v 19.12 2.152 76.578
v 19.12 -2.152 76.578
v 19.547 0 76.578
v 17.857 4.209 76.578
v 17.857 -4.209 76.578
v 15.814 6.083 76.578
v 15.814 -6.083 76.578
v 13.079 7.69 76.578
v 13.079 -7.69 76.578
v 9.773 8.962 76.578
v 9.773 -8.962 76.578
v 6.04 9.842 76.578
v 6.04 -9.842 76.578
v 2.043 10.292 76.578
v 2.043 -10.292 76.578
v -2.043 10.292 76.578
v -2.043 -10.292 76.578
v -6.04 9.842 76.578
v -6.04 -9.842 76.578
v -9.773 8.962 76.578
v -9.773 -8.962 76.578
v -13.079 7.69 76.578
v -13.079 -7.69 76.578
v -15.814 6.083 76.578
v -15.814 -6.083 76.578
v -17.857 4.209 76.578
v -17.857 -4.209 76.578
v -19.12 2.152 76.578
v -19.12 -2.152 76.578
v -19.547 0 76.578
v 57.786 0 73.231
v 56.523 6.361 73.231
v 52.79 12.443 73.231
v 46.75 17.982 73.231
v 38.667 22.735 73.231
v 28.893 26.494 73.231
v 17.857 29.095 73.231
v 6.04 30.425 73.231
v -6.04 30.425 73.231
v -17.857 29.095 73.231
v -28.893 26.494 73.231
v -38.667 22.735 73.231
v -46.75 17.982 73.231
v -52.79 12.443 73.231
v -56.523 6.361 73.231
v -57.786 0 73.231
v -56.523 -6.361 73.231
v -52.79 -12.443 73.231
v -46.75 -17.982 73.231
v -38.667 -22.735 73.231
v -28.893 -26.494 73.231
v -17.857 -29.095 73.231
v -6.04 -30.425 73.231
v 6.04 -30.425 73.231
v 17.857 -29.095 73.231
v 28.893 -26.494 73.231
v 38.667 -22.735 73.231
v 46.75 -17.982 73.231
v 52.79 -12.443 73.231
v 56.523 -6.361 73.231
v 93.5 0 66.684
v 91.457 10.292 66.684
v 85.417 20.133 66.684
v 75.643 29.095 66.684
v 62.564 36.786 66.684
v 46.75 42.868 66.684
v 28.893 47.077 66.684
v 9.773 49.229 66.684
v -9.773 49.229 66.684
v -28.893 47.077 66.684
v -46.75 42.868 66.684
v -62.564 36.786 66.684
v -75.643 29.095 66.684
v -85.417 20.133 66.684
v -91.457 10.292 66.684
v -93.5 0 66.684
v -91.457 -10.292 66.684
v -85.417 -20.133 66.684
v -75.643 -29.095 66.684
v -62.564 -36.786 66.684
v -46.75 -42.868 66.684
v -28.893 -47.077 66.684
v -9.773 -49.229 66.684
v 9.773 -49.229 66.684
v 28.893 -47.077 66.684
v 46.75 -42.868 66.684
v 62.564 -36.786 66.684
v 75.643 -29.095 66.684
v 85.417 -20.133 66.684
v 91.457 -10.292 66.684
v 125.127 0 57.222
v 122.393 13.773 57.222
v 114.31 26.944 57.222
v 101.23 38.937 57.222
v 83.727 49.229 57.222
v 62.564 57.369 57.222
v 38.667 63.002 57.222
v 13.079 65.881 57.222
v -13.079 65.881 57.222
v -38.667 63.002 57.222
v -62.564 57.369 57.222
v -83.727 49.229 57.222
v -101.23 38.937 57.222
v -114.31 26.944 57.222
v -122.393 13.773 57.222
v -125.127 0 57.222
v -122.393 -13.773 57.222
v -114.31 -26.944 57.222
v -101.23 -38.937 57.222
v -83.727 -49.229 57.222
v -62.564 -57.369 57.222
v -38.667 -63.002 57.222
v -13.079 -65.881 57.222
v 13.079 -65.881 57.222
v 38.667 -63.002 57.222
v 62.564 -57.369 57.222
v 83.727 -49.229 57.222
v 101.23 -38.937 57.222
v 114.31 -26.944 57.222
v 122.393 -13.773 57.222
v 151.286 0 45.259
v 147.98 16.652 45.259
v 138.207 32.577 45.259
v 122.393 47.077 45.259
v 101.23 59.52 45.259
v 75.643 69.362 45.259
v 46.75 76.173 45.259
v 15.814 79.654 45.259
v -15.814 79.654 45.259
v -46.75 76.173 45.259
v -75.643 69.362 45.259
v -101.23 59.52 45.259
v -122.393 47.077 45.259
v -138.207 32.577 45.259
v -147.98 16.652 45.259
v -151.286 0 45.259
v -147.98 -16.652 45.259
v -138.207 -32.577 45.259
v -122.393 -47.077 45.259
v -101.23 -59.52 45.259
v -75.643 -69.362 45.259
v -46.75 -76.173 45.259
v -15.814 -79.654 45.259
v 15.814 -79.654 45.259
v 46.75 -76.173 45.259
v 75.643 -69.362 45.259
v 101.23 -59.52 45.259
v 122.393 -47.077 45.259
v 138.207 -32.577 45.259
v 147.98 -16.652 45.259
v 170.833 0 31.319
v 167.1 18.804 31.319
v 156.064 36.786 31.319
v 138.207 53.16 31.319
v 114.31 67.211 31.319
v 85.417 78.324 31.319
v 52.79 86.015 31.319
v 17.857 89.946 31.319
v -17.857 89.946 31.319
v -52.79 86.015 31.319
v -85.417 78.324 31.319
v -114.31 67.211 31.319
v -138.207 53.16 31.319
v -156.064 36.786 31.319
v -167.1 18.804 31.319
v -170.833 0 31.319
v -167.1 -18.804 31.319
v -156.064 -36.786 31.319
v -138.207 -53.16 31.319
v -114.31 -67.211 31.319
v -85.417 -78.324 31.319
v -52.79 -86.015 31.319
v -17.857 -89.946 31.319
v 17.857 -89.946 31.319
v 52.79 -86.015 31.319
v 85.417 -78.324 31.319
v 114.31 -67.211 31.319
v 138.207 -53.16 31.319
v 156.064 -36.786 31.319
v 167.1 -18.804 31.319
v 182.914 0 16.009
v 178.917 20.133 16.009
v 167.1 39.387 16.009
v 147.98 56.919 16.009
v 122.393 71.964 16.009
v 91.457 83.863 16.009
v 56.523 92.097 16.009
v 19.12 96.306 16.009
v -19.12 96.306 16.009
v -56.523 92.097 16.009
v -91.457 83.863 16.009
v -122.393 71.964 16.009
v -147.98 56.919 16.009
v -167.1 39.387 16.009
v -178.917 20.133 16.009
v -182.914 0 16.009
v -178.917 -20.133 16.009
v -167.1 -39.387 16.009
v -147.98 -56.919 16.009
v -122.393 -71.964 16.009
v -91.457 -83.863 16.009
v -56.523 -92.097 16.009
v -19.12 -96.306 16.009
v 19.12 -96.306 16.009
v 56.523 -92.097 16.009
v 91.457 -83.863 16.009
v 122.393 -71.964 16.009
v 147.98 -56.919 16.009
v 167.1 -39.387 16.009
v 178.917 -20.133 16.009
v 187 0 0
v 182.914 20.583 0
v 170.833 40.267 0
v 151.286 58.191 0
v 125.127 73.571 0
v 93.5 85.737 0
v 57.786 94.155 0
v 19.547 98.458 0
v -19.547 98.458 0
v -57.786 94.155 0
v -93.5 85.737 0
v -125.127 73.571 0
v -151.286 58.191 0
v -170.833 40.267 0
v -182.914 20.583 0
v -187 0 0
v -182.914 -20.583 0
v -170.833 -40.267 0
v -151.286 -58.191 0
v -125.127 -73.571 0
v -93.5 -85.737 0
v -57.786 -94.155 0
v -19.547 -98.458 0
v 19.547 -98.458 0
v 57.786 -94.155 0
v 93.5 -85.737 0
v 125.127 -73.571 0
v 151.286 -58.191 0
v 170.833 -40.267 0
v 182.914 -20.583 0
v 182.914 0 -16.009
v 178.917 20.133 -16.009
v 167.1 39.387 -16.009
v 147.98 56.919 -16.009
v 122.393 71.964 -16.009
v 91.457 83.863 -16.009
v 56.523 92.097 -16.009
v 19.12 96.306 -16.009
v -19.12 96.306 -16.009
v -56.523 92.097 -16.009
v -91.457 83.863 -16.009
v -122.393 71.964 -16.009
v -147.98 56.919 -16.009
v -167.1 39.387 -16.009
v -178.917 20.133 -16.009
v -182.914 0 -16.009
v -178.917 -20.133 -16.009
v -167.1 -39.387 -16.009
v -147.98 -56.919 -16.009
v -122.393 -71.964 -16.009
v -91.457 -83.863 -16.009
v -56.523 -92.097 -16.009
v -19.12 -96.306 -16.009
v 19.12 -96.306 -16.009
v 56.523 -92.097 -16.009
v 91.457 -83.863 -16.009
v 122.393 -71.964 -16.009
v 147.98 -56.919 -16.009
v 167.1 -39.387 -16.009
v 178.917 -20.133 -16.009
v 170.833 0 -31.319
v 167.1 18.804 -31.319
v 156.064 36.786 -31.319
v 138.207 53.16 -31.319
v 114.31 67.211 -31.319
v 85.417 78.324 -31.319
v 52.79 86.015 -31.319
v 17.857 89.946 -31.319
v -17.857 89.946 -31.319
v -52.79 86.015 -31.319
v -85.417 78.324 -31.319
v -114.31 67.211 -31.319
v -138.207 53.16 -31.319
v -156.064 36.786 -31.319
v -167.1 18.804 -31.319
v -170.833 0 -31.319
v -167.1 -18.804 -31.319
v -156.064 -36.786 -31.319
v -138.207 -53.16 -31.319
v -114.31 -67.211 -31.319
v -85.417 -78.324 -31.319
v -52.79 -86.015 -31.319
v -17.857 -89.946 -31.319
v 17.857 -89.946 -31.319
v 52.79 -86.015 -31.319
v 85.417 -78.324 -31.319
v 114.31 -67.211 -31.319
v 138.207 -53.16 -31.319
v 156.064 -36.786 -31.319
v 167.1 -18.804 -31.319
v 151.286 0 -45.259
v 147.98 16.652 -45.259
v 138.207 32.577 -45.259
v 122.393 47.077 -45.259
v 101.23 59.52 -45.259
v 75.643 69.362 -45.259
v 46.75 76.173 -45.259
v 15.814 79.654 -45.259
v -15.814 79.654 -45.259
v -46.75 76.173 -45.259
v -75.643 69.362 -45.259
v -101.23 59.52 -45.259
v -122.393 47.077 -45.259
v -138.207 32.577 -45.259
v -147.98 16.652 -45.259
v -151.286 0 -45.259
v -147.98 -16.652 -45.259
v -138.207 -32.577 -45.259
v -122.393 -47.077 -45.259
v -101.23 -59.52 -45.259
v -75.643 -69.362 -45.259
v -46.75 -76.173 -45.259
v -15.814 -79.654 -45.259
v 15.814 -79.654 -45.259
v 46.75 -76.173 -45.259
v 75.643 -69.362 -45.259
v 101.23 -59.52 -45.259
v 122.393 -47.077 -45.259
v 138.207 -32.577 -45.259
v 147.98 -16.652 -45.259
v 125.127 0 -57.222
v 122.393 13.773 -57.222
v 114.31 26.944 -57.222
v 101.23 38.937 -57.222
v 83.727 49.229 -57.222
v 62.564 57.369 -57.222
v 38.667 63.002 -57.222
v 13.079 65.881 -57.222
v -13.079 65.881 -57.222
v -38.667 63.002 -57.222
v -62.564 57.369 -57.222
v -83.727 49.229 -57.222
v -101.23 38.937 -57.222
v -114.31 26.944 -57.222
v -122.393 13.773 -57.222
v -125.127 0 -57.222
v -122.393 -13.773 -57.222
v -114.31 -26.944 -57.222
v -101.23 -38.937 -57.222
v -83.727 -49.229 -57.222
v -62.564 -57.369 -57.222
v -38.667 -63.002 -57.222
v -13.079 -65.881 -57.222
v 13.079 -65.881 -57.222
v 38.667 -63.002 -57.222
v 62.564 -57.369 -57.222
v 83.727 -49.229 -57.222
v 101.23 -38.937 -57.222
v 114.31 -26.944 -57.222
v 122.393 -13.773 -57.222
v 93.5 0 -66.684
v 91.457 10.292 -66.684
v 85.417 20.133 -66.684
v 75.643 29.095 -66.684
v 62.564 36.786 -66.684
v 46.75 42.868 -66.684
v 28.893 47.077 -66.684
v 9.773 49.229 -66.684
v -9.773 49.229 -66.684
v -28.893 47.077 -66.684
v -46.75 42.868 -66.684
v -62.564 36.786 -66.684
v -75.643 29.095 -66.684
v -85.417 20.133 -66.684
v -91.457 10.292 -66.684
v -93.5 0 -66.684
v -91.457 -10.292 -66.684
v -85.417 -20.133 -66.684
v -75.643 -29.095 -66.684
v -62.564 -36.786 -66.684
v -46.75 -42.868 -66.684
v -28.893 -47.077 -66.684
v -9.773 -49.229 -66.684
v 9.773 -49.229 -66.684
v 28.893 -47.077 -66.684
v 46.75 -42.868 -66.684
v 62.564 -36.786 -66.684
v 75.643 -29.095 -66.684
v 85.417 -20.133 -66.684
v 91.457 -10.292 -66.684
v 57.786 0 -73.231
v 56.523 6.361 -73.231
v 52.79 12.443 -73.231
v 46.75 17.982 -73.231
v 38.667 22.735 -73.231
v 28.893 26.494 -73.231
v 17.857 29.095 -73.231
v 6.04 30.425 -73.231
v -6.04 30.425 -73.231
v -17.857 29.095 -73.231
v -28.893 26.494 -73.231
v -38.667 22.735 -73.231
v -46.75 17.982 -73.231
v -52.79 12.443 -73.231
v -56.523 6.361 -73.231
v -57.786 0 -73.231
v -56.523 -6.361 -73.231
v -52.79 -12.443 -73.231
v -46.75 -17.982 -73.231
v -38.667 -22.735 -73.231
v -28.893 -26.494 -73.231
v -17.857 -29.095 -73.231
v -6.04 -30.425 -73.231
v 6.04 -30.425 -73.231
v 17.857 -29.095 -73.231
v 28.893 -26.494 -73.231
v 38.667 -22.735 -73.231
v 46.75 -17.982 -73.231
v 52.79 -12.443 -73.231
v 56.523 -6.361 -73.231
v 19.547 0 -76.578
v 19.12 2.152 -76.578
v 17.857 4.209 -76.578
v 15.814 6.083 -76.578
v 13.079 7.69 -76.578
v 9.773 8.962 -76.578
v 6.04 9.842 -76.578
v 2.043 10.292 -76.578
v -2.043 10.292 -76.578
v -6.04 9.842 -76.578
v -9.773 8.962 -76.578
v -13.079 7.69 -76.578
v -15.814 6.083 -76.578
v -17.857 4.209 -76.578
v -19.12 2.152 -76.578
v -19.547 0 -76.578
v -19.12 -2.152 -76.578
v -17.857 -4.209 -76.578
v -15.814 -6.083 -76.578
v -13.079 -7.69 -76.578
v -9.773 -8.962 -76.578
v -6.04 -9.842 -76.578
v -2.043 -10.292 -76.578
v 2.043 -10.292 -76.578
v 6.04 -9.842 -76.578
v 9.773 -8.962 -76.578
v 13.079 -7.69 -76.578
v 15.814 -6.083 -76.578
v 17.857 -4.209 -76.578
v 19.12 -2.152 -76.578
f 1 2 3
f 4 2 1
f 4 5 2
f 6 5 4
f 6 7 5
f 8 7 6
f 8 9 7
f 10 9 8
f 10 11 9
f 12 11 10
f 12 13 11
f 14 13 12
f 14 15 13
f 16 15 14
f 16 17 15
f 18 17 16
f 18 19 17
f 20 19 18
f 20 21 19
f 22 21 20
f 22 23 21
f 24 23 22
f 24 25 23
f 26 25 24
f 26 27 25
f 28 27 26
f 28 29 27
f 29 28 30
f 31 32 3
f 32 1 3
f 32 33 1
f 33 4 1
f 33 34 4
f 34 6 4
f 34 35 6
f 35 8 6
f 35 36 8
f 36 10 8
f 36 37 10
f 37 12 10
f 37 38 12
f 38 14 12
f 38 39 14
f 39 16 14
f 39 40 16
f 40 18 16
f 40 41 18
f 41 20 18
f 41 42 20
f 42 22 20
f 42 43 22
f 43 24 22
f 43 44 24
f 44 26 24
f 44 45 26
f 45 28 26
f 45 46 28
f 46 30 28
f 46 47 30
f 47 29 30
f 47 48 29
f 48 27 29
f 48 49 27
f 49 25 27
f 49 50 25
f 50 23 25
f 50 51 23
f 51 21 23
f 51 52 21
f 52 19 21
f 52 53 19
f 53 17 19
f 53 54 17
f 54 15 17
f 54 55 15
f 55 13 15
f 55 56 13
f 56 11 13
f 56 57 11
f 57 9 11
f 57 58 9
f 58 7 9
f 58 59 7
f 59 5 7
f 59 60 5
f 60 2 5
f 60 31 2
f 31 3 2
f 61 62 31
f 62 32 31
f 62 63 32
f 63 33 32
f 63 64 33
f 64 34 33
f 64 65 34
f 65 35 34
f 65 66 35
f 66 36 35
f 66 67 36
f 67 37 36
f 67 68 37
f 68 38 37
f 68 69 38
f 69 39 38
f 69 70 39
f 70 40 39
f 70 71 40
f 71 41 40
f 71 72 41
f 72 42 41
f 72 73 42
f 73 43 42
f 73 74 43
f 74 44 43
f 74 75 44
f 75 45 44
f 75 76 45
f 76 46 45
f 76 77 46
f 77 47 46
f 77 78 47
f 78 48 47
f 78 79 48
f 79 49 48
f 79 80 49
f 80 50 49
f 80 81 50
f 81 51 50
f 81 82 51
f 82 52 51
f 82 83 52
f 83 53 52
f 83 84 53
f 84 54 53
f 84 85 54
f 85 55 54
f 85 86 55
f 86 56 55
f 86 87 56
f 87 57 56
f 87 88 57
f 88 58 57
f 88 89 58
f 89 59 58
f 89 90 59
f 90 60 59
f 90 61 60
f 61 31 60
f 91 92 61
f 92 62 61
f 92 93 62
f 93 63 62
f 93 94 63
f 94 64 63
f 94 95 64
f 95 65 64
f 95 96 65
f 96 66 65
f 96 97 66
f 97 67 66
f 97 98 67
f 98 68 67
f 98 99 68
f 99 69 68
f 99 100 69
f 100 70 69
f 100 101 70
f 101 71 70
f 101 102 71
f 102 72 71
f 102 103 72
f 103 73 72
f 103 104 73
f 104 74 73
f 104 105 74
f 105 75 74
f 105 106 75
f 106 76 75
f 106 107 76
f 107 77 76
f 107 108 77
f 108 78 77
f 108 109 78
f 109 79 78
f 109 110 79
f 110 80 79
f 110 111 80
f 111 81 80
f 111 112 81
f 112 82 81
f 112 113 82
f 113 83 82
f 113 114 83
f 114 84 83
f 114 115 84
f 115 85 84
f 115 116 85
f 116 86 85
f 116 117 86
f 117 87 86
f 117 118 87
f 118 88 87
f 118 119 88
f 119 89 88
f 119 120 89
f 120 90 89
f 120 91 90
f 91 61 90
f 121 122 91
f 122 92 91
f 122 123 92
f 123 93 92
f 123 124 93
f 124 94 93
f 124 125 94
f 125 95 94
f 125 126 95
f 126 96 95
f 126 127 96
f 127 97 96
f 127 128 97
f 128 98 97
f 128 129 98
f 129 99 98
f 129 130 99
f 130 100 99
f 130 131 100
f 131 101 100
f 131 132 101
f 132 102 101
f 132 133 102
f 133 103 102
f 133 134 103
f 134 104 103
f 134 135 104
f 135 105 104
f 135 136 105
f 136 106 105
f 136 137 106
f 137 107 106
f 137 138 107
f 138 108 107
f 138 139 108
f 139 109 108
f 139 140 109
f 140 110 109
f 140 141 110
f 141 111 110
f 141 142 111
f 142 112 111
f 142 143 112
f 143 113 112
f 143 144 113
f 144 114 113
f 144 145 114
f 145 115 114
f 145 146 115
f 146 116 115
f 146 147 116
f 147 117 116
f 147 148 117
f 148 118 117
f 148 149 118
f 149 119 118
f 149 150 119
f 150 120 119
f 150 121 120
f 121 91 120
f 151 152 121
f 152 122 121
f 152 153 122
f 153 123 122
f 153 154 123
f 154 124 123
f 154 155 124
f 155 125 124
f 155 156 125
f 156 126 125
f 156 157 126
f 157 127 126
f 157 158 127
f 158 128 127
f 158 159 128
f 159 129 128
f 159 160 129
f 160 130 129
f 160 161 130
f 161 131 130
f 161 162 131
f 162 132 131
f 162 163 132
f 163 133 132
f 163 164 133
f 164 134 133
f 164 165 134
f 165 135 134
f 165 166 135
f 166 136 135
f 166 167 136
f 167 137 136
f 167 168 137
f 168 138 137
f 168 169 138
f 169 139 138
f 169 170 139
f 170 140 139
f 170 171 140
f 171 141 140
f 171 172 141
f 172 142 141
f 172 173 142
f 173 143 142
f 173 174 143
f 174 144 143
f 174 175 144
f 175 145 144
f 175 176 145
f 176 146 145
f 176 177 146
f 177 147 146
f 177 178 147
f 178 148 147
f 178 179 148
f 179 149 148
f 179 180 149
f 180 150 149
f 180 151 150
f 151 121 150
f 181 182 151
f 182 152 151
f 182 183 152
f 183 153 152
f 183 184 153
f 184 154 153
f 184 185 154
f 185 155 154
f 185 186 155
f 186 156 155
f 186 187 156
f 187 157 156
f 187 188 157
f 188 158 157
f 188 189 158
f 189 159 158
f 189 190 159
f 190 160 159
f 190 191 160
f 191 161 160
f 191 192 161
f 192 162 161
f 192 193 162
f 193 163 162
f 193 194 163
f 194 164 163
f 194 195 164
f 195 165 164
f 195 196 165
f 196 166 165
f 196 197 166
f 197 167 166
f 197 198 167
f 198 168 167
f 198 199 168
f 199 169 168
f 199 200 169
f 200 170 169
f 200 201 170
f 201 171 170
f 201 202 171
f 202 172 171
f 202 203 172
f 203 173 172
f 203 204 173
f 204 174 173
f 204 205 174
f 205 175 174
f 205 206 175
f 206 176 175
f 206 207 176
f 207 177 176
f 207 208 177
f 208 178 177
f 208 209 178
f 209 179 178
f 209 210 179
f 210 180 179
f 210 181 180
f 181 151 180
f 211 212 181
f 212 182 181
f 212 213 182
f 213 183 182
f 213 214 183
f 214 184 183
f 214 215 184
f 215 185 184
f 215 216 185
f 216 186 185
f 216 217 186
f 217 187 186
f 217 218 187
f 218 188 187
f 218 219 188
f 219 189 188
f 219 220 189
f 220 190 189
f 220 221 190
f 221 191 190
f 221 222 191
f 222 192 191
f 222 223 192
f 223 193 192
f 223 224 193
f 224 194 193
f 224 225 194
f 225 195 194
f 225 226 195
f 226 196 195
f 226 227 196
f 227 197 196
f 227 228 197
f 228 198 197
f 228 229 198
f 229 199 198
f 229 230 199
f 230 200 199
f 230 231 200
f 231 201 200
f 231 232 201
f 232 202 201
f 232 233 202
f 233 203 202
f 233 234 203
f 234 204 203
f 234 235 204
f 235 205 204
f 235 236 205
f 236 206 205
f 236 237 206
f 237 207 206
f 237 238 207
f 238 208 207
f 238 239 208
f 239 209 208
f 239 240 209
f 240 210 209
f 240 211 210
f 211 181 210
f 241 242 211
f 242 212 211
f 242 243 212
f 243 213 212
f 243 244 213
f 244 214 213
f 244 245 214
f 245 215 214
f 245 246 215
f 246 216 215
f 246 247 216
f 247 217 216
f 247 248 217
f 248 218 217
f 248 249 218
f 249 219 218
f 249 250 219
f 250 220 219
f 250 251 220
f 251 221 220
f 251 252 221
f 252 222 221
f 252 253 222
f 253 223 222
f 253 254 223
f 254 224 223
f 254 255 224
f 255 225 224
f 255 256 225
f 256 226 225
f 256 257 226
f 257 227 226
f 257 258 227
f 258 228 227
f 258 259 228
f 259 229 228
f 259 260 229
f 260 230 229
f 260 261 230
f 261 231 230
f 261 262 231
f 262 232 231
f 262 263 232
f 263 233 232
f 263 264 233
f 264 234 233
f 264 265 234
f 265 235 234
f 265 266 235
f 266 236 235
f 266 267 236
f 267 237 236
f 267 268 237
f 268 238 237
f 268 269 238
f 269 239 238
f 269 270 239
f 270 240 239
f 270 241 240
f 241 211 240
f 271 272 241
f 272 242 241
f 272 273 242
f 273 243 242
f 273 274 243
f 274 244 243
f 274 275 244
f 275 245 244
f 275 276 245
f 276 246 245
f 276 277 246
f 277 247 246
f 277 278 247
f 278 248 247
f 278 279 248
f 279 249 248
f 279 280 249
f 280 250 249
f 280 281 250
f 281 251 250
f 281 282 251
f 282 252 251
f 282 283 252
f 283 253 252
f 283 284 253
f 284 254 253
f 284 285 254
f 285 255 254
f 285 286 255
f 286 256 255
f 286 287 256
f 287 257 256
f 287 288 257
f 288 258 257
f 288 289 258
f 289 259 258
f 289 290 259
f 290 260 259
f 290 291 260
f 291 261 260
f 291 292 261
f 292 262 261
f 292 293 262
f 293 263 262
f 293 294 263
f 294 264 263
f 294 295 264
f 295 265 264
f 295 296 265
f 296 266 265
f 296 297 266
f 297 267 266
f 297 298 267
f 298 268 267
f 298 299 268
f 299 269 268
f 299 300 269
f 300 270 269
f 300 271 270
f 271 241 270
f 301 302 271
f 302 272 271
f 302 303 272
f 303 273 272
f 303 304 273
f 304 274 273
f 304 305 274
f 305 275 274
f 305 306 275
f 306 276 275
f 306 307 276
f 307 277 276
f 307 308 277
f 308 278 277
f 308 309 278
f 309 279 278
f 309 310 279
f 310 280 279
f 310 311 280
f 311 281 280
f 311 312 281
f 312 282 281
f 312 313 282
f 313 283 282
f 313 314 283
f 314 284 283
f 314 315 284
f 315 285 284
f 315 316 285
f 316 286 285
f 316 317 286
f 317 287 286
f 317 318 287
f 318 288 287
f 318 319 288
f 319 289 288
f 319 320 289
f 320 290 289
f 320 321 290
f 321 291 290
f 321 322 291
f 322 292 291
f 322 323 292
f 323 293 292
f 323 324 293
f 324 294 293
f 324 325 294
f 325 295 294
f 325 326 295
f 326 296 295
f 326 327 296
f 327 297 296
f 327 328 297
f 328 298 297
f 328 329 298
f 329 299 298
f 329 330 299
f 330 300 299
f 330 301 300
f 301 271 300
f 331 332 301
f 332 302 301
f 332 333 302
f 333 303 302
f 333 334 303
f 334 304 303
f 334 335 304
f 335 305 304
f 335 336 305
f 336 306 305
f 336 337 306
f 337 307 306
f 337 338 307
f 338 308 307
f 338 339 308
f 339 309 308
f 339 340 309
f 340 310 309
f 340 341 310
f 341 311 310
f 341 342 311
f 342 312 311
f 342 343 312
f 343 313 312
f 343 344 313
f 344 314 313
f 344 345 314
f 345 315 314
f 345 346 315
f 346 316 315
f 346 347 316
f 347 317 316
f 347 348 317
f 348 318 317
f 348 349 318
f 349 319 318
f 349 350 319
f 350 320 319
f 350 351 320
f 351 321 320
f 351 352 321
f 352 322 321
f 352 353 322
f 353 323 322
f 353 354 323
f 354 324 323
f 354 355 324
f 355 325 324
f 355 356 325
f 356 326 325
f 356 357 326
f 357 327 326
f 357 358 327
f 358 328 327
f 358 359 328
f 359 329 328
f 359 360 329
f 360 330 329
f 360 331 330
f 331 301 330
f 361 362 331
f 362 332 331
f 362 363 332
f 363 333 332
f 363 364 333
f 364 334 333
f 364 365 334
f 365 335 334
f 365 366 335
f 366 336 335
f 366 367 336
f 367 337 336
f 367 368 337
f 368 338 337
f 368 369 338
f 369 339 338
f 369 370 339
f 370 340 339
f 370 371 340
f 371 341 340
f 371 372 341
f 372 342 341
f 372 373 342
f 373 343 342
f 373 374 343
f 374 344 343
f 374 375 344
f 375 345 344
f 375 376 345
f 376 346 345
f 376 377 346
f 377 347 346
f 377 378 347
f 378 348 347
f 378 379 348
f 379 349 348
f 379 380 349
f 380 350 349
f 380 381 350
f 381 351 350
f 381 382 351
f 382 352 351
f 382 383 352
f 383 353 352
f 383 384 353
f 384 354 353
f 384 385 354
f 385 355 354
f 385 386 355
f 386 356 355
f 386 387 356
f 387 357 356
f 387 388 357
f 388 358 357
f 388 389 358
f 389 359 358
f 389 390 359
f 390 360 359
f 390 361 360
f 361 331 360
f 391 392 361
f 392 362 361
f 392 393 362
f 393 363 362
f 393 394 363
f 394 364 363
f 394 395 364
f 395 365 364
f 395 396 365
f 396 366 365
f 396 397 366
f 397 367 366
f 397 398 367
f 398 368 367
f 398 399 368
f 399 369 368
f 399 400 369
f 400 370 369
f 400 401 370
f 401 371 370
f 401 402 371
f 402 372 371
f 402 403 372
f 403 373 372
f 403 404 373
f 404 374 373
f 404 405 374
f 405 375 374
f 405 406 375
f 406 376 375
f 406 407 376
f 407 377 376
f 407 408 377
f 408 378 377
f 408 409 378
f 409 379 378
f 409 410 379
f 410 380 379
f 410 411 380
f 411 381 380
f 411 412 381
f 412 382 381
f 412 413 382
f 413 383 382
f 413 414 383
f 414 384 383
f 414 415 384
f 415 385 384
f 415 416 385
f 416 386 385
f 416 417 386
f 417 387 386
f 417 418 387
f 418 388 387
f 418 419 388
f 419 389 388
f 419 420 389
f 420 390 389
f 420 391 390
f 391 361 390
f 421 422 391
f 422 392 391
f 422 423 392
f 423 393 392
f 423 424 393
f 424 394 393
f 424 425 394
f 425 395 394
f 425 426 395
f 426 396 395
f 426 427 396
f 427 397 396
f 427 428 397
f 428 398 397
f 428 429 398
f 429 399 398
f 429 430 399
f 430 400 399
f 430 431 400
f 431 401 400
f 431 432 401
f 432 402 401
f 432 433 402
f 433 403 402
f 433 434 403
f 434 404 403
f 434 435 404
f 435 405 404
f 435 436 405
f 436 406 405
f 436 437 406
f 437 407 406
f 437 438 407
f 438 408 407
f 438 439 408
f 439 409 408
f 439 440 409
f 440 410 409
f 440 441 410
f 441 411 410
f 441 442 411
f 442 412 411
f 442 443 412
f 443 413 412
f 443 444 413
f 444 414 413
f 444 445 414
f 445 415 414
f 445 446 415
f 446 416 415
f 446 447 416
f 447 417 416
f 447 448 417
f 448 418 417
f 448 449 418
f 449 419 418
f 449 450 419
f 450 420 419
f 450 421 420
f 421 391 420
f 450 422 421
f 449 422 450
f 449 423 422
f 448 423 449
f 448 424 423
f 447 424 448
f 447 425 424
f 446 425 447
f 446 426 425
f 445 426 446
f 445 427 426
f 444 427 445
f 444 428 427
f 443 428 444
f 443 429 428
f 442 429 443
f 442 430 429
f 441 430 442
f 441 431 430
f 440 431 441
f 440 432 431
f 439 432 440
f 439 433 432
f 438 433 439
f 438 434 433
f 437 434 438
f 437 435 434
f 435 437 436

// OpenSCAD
// Generated by SolidPython 1.0.1 on 2020-07-29 00:46:53


scale(v = [17, 9, 7]) {
	sphere(r = 11);
}
/***********************************************
*********      SolidPython code:      **********
************************************************
 
# import packages: SolidPython
from solid import *
from solid.utils import *
from itertools import chain, combinations, permutations


class Resize:

    def __init__(self, scad_file):
        self.scad_file = scad_file
        #self.scad_file = import_scad(scad_file)
        # cone/cylinder param:
        self.r1 = 0
        self.r2 = 0
        self.h = 0
        # rectangular prism param:
        self.w = 0
        self.l = 0
        # ellipse param:
        self.r = 0

    # import OpenScad code (file name corresponds to shape)


    # classify shape + parameters
    def assign(self, param1, param2, param3):
        if self.scad_file == 'cone.scad':
            self.r1 = param1
            self.r2 = param2
            self.h = param3
        elif self.scad_file == 'cylinder.scad':
            self.r1 = param1
            self.r2 = param2
            self.h = param3
        elif self.scad_file == 'rectangularPrism.scad':
            self.h = param1
            self.l = param2
            self.w = param3
        else:
            self.r = param1
            self.h = param2

    # resize parameters
    def iterate(self):
        x = range(3, 20, 2)
        i = 1
        if self.scad_file == 'cone.scad':
            tempList = list(permutations(x, 2))
            for temp in tempList:
                param1 = temp[0]
                param2 = temp[1]
                filepath = 'produced_scad_files/' + 'cone' + str(param1) + '_' + str(param2) + '_' + '.scad'
                scad_render_to_file(cylinder(h=param1, r1=param2, r2=0), filepath)

        elif self.scad_file == 'cylinder.scad':
            tempList = list(permutations(x, 3))
            for temp in tempList:
                param1 = temp[0]
                param2 = temp[1]
                filepath = 'produced_scad_files/' + 'cylinder' + str(param1) + '_' + str(param2) + '_' + '.scad'
                scad_render_to_file(cylinder(h=param1, r1=param2, r2=param2), filepath)

        elif self.scad_file == 'rectangularPrism.scad':
            tempList = list(permutations(x, 3))
            for temp in tempList:
                param1 = temp[0]
                param2 = temp[1]
                param3 = temp[2]
                filepath = 'produced_scad_files/' + 'rectangularPrism' + str(param1) + '_' + str(param2) + '_' + str(
                    param3) + '.scad'
                scad_render_to_file(cube(size=(param1, param2, param3)), filepath)

        elif self.scad_file == 'ellipse.scad':
            tempList = list(permutations(x, 4))
            for temp in tempList:
                param1 = temp[0]
                param2 = temp[1]
                param3 = temp[2]
                param4 = temp[3]
                filepath = 'produced_scad_files/' + 'ellipse' + str(param1) + '_' + str(param2) + '_' + str(param3) + '_' + str(param4) + '.scad'
                scad_render_to_file(scale([param1, param2, param3])(sphere(r=param4)), filepath)

    def render_to_scadfile(self):
        scad_render_to_file(scad, 'example.scad') 
 
************************************************/
